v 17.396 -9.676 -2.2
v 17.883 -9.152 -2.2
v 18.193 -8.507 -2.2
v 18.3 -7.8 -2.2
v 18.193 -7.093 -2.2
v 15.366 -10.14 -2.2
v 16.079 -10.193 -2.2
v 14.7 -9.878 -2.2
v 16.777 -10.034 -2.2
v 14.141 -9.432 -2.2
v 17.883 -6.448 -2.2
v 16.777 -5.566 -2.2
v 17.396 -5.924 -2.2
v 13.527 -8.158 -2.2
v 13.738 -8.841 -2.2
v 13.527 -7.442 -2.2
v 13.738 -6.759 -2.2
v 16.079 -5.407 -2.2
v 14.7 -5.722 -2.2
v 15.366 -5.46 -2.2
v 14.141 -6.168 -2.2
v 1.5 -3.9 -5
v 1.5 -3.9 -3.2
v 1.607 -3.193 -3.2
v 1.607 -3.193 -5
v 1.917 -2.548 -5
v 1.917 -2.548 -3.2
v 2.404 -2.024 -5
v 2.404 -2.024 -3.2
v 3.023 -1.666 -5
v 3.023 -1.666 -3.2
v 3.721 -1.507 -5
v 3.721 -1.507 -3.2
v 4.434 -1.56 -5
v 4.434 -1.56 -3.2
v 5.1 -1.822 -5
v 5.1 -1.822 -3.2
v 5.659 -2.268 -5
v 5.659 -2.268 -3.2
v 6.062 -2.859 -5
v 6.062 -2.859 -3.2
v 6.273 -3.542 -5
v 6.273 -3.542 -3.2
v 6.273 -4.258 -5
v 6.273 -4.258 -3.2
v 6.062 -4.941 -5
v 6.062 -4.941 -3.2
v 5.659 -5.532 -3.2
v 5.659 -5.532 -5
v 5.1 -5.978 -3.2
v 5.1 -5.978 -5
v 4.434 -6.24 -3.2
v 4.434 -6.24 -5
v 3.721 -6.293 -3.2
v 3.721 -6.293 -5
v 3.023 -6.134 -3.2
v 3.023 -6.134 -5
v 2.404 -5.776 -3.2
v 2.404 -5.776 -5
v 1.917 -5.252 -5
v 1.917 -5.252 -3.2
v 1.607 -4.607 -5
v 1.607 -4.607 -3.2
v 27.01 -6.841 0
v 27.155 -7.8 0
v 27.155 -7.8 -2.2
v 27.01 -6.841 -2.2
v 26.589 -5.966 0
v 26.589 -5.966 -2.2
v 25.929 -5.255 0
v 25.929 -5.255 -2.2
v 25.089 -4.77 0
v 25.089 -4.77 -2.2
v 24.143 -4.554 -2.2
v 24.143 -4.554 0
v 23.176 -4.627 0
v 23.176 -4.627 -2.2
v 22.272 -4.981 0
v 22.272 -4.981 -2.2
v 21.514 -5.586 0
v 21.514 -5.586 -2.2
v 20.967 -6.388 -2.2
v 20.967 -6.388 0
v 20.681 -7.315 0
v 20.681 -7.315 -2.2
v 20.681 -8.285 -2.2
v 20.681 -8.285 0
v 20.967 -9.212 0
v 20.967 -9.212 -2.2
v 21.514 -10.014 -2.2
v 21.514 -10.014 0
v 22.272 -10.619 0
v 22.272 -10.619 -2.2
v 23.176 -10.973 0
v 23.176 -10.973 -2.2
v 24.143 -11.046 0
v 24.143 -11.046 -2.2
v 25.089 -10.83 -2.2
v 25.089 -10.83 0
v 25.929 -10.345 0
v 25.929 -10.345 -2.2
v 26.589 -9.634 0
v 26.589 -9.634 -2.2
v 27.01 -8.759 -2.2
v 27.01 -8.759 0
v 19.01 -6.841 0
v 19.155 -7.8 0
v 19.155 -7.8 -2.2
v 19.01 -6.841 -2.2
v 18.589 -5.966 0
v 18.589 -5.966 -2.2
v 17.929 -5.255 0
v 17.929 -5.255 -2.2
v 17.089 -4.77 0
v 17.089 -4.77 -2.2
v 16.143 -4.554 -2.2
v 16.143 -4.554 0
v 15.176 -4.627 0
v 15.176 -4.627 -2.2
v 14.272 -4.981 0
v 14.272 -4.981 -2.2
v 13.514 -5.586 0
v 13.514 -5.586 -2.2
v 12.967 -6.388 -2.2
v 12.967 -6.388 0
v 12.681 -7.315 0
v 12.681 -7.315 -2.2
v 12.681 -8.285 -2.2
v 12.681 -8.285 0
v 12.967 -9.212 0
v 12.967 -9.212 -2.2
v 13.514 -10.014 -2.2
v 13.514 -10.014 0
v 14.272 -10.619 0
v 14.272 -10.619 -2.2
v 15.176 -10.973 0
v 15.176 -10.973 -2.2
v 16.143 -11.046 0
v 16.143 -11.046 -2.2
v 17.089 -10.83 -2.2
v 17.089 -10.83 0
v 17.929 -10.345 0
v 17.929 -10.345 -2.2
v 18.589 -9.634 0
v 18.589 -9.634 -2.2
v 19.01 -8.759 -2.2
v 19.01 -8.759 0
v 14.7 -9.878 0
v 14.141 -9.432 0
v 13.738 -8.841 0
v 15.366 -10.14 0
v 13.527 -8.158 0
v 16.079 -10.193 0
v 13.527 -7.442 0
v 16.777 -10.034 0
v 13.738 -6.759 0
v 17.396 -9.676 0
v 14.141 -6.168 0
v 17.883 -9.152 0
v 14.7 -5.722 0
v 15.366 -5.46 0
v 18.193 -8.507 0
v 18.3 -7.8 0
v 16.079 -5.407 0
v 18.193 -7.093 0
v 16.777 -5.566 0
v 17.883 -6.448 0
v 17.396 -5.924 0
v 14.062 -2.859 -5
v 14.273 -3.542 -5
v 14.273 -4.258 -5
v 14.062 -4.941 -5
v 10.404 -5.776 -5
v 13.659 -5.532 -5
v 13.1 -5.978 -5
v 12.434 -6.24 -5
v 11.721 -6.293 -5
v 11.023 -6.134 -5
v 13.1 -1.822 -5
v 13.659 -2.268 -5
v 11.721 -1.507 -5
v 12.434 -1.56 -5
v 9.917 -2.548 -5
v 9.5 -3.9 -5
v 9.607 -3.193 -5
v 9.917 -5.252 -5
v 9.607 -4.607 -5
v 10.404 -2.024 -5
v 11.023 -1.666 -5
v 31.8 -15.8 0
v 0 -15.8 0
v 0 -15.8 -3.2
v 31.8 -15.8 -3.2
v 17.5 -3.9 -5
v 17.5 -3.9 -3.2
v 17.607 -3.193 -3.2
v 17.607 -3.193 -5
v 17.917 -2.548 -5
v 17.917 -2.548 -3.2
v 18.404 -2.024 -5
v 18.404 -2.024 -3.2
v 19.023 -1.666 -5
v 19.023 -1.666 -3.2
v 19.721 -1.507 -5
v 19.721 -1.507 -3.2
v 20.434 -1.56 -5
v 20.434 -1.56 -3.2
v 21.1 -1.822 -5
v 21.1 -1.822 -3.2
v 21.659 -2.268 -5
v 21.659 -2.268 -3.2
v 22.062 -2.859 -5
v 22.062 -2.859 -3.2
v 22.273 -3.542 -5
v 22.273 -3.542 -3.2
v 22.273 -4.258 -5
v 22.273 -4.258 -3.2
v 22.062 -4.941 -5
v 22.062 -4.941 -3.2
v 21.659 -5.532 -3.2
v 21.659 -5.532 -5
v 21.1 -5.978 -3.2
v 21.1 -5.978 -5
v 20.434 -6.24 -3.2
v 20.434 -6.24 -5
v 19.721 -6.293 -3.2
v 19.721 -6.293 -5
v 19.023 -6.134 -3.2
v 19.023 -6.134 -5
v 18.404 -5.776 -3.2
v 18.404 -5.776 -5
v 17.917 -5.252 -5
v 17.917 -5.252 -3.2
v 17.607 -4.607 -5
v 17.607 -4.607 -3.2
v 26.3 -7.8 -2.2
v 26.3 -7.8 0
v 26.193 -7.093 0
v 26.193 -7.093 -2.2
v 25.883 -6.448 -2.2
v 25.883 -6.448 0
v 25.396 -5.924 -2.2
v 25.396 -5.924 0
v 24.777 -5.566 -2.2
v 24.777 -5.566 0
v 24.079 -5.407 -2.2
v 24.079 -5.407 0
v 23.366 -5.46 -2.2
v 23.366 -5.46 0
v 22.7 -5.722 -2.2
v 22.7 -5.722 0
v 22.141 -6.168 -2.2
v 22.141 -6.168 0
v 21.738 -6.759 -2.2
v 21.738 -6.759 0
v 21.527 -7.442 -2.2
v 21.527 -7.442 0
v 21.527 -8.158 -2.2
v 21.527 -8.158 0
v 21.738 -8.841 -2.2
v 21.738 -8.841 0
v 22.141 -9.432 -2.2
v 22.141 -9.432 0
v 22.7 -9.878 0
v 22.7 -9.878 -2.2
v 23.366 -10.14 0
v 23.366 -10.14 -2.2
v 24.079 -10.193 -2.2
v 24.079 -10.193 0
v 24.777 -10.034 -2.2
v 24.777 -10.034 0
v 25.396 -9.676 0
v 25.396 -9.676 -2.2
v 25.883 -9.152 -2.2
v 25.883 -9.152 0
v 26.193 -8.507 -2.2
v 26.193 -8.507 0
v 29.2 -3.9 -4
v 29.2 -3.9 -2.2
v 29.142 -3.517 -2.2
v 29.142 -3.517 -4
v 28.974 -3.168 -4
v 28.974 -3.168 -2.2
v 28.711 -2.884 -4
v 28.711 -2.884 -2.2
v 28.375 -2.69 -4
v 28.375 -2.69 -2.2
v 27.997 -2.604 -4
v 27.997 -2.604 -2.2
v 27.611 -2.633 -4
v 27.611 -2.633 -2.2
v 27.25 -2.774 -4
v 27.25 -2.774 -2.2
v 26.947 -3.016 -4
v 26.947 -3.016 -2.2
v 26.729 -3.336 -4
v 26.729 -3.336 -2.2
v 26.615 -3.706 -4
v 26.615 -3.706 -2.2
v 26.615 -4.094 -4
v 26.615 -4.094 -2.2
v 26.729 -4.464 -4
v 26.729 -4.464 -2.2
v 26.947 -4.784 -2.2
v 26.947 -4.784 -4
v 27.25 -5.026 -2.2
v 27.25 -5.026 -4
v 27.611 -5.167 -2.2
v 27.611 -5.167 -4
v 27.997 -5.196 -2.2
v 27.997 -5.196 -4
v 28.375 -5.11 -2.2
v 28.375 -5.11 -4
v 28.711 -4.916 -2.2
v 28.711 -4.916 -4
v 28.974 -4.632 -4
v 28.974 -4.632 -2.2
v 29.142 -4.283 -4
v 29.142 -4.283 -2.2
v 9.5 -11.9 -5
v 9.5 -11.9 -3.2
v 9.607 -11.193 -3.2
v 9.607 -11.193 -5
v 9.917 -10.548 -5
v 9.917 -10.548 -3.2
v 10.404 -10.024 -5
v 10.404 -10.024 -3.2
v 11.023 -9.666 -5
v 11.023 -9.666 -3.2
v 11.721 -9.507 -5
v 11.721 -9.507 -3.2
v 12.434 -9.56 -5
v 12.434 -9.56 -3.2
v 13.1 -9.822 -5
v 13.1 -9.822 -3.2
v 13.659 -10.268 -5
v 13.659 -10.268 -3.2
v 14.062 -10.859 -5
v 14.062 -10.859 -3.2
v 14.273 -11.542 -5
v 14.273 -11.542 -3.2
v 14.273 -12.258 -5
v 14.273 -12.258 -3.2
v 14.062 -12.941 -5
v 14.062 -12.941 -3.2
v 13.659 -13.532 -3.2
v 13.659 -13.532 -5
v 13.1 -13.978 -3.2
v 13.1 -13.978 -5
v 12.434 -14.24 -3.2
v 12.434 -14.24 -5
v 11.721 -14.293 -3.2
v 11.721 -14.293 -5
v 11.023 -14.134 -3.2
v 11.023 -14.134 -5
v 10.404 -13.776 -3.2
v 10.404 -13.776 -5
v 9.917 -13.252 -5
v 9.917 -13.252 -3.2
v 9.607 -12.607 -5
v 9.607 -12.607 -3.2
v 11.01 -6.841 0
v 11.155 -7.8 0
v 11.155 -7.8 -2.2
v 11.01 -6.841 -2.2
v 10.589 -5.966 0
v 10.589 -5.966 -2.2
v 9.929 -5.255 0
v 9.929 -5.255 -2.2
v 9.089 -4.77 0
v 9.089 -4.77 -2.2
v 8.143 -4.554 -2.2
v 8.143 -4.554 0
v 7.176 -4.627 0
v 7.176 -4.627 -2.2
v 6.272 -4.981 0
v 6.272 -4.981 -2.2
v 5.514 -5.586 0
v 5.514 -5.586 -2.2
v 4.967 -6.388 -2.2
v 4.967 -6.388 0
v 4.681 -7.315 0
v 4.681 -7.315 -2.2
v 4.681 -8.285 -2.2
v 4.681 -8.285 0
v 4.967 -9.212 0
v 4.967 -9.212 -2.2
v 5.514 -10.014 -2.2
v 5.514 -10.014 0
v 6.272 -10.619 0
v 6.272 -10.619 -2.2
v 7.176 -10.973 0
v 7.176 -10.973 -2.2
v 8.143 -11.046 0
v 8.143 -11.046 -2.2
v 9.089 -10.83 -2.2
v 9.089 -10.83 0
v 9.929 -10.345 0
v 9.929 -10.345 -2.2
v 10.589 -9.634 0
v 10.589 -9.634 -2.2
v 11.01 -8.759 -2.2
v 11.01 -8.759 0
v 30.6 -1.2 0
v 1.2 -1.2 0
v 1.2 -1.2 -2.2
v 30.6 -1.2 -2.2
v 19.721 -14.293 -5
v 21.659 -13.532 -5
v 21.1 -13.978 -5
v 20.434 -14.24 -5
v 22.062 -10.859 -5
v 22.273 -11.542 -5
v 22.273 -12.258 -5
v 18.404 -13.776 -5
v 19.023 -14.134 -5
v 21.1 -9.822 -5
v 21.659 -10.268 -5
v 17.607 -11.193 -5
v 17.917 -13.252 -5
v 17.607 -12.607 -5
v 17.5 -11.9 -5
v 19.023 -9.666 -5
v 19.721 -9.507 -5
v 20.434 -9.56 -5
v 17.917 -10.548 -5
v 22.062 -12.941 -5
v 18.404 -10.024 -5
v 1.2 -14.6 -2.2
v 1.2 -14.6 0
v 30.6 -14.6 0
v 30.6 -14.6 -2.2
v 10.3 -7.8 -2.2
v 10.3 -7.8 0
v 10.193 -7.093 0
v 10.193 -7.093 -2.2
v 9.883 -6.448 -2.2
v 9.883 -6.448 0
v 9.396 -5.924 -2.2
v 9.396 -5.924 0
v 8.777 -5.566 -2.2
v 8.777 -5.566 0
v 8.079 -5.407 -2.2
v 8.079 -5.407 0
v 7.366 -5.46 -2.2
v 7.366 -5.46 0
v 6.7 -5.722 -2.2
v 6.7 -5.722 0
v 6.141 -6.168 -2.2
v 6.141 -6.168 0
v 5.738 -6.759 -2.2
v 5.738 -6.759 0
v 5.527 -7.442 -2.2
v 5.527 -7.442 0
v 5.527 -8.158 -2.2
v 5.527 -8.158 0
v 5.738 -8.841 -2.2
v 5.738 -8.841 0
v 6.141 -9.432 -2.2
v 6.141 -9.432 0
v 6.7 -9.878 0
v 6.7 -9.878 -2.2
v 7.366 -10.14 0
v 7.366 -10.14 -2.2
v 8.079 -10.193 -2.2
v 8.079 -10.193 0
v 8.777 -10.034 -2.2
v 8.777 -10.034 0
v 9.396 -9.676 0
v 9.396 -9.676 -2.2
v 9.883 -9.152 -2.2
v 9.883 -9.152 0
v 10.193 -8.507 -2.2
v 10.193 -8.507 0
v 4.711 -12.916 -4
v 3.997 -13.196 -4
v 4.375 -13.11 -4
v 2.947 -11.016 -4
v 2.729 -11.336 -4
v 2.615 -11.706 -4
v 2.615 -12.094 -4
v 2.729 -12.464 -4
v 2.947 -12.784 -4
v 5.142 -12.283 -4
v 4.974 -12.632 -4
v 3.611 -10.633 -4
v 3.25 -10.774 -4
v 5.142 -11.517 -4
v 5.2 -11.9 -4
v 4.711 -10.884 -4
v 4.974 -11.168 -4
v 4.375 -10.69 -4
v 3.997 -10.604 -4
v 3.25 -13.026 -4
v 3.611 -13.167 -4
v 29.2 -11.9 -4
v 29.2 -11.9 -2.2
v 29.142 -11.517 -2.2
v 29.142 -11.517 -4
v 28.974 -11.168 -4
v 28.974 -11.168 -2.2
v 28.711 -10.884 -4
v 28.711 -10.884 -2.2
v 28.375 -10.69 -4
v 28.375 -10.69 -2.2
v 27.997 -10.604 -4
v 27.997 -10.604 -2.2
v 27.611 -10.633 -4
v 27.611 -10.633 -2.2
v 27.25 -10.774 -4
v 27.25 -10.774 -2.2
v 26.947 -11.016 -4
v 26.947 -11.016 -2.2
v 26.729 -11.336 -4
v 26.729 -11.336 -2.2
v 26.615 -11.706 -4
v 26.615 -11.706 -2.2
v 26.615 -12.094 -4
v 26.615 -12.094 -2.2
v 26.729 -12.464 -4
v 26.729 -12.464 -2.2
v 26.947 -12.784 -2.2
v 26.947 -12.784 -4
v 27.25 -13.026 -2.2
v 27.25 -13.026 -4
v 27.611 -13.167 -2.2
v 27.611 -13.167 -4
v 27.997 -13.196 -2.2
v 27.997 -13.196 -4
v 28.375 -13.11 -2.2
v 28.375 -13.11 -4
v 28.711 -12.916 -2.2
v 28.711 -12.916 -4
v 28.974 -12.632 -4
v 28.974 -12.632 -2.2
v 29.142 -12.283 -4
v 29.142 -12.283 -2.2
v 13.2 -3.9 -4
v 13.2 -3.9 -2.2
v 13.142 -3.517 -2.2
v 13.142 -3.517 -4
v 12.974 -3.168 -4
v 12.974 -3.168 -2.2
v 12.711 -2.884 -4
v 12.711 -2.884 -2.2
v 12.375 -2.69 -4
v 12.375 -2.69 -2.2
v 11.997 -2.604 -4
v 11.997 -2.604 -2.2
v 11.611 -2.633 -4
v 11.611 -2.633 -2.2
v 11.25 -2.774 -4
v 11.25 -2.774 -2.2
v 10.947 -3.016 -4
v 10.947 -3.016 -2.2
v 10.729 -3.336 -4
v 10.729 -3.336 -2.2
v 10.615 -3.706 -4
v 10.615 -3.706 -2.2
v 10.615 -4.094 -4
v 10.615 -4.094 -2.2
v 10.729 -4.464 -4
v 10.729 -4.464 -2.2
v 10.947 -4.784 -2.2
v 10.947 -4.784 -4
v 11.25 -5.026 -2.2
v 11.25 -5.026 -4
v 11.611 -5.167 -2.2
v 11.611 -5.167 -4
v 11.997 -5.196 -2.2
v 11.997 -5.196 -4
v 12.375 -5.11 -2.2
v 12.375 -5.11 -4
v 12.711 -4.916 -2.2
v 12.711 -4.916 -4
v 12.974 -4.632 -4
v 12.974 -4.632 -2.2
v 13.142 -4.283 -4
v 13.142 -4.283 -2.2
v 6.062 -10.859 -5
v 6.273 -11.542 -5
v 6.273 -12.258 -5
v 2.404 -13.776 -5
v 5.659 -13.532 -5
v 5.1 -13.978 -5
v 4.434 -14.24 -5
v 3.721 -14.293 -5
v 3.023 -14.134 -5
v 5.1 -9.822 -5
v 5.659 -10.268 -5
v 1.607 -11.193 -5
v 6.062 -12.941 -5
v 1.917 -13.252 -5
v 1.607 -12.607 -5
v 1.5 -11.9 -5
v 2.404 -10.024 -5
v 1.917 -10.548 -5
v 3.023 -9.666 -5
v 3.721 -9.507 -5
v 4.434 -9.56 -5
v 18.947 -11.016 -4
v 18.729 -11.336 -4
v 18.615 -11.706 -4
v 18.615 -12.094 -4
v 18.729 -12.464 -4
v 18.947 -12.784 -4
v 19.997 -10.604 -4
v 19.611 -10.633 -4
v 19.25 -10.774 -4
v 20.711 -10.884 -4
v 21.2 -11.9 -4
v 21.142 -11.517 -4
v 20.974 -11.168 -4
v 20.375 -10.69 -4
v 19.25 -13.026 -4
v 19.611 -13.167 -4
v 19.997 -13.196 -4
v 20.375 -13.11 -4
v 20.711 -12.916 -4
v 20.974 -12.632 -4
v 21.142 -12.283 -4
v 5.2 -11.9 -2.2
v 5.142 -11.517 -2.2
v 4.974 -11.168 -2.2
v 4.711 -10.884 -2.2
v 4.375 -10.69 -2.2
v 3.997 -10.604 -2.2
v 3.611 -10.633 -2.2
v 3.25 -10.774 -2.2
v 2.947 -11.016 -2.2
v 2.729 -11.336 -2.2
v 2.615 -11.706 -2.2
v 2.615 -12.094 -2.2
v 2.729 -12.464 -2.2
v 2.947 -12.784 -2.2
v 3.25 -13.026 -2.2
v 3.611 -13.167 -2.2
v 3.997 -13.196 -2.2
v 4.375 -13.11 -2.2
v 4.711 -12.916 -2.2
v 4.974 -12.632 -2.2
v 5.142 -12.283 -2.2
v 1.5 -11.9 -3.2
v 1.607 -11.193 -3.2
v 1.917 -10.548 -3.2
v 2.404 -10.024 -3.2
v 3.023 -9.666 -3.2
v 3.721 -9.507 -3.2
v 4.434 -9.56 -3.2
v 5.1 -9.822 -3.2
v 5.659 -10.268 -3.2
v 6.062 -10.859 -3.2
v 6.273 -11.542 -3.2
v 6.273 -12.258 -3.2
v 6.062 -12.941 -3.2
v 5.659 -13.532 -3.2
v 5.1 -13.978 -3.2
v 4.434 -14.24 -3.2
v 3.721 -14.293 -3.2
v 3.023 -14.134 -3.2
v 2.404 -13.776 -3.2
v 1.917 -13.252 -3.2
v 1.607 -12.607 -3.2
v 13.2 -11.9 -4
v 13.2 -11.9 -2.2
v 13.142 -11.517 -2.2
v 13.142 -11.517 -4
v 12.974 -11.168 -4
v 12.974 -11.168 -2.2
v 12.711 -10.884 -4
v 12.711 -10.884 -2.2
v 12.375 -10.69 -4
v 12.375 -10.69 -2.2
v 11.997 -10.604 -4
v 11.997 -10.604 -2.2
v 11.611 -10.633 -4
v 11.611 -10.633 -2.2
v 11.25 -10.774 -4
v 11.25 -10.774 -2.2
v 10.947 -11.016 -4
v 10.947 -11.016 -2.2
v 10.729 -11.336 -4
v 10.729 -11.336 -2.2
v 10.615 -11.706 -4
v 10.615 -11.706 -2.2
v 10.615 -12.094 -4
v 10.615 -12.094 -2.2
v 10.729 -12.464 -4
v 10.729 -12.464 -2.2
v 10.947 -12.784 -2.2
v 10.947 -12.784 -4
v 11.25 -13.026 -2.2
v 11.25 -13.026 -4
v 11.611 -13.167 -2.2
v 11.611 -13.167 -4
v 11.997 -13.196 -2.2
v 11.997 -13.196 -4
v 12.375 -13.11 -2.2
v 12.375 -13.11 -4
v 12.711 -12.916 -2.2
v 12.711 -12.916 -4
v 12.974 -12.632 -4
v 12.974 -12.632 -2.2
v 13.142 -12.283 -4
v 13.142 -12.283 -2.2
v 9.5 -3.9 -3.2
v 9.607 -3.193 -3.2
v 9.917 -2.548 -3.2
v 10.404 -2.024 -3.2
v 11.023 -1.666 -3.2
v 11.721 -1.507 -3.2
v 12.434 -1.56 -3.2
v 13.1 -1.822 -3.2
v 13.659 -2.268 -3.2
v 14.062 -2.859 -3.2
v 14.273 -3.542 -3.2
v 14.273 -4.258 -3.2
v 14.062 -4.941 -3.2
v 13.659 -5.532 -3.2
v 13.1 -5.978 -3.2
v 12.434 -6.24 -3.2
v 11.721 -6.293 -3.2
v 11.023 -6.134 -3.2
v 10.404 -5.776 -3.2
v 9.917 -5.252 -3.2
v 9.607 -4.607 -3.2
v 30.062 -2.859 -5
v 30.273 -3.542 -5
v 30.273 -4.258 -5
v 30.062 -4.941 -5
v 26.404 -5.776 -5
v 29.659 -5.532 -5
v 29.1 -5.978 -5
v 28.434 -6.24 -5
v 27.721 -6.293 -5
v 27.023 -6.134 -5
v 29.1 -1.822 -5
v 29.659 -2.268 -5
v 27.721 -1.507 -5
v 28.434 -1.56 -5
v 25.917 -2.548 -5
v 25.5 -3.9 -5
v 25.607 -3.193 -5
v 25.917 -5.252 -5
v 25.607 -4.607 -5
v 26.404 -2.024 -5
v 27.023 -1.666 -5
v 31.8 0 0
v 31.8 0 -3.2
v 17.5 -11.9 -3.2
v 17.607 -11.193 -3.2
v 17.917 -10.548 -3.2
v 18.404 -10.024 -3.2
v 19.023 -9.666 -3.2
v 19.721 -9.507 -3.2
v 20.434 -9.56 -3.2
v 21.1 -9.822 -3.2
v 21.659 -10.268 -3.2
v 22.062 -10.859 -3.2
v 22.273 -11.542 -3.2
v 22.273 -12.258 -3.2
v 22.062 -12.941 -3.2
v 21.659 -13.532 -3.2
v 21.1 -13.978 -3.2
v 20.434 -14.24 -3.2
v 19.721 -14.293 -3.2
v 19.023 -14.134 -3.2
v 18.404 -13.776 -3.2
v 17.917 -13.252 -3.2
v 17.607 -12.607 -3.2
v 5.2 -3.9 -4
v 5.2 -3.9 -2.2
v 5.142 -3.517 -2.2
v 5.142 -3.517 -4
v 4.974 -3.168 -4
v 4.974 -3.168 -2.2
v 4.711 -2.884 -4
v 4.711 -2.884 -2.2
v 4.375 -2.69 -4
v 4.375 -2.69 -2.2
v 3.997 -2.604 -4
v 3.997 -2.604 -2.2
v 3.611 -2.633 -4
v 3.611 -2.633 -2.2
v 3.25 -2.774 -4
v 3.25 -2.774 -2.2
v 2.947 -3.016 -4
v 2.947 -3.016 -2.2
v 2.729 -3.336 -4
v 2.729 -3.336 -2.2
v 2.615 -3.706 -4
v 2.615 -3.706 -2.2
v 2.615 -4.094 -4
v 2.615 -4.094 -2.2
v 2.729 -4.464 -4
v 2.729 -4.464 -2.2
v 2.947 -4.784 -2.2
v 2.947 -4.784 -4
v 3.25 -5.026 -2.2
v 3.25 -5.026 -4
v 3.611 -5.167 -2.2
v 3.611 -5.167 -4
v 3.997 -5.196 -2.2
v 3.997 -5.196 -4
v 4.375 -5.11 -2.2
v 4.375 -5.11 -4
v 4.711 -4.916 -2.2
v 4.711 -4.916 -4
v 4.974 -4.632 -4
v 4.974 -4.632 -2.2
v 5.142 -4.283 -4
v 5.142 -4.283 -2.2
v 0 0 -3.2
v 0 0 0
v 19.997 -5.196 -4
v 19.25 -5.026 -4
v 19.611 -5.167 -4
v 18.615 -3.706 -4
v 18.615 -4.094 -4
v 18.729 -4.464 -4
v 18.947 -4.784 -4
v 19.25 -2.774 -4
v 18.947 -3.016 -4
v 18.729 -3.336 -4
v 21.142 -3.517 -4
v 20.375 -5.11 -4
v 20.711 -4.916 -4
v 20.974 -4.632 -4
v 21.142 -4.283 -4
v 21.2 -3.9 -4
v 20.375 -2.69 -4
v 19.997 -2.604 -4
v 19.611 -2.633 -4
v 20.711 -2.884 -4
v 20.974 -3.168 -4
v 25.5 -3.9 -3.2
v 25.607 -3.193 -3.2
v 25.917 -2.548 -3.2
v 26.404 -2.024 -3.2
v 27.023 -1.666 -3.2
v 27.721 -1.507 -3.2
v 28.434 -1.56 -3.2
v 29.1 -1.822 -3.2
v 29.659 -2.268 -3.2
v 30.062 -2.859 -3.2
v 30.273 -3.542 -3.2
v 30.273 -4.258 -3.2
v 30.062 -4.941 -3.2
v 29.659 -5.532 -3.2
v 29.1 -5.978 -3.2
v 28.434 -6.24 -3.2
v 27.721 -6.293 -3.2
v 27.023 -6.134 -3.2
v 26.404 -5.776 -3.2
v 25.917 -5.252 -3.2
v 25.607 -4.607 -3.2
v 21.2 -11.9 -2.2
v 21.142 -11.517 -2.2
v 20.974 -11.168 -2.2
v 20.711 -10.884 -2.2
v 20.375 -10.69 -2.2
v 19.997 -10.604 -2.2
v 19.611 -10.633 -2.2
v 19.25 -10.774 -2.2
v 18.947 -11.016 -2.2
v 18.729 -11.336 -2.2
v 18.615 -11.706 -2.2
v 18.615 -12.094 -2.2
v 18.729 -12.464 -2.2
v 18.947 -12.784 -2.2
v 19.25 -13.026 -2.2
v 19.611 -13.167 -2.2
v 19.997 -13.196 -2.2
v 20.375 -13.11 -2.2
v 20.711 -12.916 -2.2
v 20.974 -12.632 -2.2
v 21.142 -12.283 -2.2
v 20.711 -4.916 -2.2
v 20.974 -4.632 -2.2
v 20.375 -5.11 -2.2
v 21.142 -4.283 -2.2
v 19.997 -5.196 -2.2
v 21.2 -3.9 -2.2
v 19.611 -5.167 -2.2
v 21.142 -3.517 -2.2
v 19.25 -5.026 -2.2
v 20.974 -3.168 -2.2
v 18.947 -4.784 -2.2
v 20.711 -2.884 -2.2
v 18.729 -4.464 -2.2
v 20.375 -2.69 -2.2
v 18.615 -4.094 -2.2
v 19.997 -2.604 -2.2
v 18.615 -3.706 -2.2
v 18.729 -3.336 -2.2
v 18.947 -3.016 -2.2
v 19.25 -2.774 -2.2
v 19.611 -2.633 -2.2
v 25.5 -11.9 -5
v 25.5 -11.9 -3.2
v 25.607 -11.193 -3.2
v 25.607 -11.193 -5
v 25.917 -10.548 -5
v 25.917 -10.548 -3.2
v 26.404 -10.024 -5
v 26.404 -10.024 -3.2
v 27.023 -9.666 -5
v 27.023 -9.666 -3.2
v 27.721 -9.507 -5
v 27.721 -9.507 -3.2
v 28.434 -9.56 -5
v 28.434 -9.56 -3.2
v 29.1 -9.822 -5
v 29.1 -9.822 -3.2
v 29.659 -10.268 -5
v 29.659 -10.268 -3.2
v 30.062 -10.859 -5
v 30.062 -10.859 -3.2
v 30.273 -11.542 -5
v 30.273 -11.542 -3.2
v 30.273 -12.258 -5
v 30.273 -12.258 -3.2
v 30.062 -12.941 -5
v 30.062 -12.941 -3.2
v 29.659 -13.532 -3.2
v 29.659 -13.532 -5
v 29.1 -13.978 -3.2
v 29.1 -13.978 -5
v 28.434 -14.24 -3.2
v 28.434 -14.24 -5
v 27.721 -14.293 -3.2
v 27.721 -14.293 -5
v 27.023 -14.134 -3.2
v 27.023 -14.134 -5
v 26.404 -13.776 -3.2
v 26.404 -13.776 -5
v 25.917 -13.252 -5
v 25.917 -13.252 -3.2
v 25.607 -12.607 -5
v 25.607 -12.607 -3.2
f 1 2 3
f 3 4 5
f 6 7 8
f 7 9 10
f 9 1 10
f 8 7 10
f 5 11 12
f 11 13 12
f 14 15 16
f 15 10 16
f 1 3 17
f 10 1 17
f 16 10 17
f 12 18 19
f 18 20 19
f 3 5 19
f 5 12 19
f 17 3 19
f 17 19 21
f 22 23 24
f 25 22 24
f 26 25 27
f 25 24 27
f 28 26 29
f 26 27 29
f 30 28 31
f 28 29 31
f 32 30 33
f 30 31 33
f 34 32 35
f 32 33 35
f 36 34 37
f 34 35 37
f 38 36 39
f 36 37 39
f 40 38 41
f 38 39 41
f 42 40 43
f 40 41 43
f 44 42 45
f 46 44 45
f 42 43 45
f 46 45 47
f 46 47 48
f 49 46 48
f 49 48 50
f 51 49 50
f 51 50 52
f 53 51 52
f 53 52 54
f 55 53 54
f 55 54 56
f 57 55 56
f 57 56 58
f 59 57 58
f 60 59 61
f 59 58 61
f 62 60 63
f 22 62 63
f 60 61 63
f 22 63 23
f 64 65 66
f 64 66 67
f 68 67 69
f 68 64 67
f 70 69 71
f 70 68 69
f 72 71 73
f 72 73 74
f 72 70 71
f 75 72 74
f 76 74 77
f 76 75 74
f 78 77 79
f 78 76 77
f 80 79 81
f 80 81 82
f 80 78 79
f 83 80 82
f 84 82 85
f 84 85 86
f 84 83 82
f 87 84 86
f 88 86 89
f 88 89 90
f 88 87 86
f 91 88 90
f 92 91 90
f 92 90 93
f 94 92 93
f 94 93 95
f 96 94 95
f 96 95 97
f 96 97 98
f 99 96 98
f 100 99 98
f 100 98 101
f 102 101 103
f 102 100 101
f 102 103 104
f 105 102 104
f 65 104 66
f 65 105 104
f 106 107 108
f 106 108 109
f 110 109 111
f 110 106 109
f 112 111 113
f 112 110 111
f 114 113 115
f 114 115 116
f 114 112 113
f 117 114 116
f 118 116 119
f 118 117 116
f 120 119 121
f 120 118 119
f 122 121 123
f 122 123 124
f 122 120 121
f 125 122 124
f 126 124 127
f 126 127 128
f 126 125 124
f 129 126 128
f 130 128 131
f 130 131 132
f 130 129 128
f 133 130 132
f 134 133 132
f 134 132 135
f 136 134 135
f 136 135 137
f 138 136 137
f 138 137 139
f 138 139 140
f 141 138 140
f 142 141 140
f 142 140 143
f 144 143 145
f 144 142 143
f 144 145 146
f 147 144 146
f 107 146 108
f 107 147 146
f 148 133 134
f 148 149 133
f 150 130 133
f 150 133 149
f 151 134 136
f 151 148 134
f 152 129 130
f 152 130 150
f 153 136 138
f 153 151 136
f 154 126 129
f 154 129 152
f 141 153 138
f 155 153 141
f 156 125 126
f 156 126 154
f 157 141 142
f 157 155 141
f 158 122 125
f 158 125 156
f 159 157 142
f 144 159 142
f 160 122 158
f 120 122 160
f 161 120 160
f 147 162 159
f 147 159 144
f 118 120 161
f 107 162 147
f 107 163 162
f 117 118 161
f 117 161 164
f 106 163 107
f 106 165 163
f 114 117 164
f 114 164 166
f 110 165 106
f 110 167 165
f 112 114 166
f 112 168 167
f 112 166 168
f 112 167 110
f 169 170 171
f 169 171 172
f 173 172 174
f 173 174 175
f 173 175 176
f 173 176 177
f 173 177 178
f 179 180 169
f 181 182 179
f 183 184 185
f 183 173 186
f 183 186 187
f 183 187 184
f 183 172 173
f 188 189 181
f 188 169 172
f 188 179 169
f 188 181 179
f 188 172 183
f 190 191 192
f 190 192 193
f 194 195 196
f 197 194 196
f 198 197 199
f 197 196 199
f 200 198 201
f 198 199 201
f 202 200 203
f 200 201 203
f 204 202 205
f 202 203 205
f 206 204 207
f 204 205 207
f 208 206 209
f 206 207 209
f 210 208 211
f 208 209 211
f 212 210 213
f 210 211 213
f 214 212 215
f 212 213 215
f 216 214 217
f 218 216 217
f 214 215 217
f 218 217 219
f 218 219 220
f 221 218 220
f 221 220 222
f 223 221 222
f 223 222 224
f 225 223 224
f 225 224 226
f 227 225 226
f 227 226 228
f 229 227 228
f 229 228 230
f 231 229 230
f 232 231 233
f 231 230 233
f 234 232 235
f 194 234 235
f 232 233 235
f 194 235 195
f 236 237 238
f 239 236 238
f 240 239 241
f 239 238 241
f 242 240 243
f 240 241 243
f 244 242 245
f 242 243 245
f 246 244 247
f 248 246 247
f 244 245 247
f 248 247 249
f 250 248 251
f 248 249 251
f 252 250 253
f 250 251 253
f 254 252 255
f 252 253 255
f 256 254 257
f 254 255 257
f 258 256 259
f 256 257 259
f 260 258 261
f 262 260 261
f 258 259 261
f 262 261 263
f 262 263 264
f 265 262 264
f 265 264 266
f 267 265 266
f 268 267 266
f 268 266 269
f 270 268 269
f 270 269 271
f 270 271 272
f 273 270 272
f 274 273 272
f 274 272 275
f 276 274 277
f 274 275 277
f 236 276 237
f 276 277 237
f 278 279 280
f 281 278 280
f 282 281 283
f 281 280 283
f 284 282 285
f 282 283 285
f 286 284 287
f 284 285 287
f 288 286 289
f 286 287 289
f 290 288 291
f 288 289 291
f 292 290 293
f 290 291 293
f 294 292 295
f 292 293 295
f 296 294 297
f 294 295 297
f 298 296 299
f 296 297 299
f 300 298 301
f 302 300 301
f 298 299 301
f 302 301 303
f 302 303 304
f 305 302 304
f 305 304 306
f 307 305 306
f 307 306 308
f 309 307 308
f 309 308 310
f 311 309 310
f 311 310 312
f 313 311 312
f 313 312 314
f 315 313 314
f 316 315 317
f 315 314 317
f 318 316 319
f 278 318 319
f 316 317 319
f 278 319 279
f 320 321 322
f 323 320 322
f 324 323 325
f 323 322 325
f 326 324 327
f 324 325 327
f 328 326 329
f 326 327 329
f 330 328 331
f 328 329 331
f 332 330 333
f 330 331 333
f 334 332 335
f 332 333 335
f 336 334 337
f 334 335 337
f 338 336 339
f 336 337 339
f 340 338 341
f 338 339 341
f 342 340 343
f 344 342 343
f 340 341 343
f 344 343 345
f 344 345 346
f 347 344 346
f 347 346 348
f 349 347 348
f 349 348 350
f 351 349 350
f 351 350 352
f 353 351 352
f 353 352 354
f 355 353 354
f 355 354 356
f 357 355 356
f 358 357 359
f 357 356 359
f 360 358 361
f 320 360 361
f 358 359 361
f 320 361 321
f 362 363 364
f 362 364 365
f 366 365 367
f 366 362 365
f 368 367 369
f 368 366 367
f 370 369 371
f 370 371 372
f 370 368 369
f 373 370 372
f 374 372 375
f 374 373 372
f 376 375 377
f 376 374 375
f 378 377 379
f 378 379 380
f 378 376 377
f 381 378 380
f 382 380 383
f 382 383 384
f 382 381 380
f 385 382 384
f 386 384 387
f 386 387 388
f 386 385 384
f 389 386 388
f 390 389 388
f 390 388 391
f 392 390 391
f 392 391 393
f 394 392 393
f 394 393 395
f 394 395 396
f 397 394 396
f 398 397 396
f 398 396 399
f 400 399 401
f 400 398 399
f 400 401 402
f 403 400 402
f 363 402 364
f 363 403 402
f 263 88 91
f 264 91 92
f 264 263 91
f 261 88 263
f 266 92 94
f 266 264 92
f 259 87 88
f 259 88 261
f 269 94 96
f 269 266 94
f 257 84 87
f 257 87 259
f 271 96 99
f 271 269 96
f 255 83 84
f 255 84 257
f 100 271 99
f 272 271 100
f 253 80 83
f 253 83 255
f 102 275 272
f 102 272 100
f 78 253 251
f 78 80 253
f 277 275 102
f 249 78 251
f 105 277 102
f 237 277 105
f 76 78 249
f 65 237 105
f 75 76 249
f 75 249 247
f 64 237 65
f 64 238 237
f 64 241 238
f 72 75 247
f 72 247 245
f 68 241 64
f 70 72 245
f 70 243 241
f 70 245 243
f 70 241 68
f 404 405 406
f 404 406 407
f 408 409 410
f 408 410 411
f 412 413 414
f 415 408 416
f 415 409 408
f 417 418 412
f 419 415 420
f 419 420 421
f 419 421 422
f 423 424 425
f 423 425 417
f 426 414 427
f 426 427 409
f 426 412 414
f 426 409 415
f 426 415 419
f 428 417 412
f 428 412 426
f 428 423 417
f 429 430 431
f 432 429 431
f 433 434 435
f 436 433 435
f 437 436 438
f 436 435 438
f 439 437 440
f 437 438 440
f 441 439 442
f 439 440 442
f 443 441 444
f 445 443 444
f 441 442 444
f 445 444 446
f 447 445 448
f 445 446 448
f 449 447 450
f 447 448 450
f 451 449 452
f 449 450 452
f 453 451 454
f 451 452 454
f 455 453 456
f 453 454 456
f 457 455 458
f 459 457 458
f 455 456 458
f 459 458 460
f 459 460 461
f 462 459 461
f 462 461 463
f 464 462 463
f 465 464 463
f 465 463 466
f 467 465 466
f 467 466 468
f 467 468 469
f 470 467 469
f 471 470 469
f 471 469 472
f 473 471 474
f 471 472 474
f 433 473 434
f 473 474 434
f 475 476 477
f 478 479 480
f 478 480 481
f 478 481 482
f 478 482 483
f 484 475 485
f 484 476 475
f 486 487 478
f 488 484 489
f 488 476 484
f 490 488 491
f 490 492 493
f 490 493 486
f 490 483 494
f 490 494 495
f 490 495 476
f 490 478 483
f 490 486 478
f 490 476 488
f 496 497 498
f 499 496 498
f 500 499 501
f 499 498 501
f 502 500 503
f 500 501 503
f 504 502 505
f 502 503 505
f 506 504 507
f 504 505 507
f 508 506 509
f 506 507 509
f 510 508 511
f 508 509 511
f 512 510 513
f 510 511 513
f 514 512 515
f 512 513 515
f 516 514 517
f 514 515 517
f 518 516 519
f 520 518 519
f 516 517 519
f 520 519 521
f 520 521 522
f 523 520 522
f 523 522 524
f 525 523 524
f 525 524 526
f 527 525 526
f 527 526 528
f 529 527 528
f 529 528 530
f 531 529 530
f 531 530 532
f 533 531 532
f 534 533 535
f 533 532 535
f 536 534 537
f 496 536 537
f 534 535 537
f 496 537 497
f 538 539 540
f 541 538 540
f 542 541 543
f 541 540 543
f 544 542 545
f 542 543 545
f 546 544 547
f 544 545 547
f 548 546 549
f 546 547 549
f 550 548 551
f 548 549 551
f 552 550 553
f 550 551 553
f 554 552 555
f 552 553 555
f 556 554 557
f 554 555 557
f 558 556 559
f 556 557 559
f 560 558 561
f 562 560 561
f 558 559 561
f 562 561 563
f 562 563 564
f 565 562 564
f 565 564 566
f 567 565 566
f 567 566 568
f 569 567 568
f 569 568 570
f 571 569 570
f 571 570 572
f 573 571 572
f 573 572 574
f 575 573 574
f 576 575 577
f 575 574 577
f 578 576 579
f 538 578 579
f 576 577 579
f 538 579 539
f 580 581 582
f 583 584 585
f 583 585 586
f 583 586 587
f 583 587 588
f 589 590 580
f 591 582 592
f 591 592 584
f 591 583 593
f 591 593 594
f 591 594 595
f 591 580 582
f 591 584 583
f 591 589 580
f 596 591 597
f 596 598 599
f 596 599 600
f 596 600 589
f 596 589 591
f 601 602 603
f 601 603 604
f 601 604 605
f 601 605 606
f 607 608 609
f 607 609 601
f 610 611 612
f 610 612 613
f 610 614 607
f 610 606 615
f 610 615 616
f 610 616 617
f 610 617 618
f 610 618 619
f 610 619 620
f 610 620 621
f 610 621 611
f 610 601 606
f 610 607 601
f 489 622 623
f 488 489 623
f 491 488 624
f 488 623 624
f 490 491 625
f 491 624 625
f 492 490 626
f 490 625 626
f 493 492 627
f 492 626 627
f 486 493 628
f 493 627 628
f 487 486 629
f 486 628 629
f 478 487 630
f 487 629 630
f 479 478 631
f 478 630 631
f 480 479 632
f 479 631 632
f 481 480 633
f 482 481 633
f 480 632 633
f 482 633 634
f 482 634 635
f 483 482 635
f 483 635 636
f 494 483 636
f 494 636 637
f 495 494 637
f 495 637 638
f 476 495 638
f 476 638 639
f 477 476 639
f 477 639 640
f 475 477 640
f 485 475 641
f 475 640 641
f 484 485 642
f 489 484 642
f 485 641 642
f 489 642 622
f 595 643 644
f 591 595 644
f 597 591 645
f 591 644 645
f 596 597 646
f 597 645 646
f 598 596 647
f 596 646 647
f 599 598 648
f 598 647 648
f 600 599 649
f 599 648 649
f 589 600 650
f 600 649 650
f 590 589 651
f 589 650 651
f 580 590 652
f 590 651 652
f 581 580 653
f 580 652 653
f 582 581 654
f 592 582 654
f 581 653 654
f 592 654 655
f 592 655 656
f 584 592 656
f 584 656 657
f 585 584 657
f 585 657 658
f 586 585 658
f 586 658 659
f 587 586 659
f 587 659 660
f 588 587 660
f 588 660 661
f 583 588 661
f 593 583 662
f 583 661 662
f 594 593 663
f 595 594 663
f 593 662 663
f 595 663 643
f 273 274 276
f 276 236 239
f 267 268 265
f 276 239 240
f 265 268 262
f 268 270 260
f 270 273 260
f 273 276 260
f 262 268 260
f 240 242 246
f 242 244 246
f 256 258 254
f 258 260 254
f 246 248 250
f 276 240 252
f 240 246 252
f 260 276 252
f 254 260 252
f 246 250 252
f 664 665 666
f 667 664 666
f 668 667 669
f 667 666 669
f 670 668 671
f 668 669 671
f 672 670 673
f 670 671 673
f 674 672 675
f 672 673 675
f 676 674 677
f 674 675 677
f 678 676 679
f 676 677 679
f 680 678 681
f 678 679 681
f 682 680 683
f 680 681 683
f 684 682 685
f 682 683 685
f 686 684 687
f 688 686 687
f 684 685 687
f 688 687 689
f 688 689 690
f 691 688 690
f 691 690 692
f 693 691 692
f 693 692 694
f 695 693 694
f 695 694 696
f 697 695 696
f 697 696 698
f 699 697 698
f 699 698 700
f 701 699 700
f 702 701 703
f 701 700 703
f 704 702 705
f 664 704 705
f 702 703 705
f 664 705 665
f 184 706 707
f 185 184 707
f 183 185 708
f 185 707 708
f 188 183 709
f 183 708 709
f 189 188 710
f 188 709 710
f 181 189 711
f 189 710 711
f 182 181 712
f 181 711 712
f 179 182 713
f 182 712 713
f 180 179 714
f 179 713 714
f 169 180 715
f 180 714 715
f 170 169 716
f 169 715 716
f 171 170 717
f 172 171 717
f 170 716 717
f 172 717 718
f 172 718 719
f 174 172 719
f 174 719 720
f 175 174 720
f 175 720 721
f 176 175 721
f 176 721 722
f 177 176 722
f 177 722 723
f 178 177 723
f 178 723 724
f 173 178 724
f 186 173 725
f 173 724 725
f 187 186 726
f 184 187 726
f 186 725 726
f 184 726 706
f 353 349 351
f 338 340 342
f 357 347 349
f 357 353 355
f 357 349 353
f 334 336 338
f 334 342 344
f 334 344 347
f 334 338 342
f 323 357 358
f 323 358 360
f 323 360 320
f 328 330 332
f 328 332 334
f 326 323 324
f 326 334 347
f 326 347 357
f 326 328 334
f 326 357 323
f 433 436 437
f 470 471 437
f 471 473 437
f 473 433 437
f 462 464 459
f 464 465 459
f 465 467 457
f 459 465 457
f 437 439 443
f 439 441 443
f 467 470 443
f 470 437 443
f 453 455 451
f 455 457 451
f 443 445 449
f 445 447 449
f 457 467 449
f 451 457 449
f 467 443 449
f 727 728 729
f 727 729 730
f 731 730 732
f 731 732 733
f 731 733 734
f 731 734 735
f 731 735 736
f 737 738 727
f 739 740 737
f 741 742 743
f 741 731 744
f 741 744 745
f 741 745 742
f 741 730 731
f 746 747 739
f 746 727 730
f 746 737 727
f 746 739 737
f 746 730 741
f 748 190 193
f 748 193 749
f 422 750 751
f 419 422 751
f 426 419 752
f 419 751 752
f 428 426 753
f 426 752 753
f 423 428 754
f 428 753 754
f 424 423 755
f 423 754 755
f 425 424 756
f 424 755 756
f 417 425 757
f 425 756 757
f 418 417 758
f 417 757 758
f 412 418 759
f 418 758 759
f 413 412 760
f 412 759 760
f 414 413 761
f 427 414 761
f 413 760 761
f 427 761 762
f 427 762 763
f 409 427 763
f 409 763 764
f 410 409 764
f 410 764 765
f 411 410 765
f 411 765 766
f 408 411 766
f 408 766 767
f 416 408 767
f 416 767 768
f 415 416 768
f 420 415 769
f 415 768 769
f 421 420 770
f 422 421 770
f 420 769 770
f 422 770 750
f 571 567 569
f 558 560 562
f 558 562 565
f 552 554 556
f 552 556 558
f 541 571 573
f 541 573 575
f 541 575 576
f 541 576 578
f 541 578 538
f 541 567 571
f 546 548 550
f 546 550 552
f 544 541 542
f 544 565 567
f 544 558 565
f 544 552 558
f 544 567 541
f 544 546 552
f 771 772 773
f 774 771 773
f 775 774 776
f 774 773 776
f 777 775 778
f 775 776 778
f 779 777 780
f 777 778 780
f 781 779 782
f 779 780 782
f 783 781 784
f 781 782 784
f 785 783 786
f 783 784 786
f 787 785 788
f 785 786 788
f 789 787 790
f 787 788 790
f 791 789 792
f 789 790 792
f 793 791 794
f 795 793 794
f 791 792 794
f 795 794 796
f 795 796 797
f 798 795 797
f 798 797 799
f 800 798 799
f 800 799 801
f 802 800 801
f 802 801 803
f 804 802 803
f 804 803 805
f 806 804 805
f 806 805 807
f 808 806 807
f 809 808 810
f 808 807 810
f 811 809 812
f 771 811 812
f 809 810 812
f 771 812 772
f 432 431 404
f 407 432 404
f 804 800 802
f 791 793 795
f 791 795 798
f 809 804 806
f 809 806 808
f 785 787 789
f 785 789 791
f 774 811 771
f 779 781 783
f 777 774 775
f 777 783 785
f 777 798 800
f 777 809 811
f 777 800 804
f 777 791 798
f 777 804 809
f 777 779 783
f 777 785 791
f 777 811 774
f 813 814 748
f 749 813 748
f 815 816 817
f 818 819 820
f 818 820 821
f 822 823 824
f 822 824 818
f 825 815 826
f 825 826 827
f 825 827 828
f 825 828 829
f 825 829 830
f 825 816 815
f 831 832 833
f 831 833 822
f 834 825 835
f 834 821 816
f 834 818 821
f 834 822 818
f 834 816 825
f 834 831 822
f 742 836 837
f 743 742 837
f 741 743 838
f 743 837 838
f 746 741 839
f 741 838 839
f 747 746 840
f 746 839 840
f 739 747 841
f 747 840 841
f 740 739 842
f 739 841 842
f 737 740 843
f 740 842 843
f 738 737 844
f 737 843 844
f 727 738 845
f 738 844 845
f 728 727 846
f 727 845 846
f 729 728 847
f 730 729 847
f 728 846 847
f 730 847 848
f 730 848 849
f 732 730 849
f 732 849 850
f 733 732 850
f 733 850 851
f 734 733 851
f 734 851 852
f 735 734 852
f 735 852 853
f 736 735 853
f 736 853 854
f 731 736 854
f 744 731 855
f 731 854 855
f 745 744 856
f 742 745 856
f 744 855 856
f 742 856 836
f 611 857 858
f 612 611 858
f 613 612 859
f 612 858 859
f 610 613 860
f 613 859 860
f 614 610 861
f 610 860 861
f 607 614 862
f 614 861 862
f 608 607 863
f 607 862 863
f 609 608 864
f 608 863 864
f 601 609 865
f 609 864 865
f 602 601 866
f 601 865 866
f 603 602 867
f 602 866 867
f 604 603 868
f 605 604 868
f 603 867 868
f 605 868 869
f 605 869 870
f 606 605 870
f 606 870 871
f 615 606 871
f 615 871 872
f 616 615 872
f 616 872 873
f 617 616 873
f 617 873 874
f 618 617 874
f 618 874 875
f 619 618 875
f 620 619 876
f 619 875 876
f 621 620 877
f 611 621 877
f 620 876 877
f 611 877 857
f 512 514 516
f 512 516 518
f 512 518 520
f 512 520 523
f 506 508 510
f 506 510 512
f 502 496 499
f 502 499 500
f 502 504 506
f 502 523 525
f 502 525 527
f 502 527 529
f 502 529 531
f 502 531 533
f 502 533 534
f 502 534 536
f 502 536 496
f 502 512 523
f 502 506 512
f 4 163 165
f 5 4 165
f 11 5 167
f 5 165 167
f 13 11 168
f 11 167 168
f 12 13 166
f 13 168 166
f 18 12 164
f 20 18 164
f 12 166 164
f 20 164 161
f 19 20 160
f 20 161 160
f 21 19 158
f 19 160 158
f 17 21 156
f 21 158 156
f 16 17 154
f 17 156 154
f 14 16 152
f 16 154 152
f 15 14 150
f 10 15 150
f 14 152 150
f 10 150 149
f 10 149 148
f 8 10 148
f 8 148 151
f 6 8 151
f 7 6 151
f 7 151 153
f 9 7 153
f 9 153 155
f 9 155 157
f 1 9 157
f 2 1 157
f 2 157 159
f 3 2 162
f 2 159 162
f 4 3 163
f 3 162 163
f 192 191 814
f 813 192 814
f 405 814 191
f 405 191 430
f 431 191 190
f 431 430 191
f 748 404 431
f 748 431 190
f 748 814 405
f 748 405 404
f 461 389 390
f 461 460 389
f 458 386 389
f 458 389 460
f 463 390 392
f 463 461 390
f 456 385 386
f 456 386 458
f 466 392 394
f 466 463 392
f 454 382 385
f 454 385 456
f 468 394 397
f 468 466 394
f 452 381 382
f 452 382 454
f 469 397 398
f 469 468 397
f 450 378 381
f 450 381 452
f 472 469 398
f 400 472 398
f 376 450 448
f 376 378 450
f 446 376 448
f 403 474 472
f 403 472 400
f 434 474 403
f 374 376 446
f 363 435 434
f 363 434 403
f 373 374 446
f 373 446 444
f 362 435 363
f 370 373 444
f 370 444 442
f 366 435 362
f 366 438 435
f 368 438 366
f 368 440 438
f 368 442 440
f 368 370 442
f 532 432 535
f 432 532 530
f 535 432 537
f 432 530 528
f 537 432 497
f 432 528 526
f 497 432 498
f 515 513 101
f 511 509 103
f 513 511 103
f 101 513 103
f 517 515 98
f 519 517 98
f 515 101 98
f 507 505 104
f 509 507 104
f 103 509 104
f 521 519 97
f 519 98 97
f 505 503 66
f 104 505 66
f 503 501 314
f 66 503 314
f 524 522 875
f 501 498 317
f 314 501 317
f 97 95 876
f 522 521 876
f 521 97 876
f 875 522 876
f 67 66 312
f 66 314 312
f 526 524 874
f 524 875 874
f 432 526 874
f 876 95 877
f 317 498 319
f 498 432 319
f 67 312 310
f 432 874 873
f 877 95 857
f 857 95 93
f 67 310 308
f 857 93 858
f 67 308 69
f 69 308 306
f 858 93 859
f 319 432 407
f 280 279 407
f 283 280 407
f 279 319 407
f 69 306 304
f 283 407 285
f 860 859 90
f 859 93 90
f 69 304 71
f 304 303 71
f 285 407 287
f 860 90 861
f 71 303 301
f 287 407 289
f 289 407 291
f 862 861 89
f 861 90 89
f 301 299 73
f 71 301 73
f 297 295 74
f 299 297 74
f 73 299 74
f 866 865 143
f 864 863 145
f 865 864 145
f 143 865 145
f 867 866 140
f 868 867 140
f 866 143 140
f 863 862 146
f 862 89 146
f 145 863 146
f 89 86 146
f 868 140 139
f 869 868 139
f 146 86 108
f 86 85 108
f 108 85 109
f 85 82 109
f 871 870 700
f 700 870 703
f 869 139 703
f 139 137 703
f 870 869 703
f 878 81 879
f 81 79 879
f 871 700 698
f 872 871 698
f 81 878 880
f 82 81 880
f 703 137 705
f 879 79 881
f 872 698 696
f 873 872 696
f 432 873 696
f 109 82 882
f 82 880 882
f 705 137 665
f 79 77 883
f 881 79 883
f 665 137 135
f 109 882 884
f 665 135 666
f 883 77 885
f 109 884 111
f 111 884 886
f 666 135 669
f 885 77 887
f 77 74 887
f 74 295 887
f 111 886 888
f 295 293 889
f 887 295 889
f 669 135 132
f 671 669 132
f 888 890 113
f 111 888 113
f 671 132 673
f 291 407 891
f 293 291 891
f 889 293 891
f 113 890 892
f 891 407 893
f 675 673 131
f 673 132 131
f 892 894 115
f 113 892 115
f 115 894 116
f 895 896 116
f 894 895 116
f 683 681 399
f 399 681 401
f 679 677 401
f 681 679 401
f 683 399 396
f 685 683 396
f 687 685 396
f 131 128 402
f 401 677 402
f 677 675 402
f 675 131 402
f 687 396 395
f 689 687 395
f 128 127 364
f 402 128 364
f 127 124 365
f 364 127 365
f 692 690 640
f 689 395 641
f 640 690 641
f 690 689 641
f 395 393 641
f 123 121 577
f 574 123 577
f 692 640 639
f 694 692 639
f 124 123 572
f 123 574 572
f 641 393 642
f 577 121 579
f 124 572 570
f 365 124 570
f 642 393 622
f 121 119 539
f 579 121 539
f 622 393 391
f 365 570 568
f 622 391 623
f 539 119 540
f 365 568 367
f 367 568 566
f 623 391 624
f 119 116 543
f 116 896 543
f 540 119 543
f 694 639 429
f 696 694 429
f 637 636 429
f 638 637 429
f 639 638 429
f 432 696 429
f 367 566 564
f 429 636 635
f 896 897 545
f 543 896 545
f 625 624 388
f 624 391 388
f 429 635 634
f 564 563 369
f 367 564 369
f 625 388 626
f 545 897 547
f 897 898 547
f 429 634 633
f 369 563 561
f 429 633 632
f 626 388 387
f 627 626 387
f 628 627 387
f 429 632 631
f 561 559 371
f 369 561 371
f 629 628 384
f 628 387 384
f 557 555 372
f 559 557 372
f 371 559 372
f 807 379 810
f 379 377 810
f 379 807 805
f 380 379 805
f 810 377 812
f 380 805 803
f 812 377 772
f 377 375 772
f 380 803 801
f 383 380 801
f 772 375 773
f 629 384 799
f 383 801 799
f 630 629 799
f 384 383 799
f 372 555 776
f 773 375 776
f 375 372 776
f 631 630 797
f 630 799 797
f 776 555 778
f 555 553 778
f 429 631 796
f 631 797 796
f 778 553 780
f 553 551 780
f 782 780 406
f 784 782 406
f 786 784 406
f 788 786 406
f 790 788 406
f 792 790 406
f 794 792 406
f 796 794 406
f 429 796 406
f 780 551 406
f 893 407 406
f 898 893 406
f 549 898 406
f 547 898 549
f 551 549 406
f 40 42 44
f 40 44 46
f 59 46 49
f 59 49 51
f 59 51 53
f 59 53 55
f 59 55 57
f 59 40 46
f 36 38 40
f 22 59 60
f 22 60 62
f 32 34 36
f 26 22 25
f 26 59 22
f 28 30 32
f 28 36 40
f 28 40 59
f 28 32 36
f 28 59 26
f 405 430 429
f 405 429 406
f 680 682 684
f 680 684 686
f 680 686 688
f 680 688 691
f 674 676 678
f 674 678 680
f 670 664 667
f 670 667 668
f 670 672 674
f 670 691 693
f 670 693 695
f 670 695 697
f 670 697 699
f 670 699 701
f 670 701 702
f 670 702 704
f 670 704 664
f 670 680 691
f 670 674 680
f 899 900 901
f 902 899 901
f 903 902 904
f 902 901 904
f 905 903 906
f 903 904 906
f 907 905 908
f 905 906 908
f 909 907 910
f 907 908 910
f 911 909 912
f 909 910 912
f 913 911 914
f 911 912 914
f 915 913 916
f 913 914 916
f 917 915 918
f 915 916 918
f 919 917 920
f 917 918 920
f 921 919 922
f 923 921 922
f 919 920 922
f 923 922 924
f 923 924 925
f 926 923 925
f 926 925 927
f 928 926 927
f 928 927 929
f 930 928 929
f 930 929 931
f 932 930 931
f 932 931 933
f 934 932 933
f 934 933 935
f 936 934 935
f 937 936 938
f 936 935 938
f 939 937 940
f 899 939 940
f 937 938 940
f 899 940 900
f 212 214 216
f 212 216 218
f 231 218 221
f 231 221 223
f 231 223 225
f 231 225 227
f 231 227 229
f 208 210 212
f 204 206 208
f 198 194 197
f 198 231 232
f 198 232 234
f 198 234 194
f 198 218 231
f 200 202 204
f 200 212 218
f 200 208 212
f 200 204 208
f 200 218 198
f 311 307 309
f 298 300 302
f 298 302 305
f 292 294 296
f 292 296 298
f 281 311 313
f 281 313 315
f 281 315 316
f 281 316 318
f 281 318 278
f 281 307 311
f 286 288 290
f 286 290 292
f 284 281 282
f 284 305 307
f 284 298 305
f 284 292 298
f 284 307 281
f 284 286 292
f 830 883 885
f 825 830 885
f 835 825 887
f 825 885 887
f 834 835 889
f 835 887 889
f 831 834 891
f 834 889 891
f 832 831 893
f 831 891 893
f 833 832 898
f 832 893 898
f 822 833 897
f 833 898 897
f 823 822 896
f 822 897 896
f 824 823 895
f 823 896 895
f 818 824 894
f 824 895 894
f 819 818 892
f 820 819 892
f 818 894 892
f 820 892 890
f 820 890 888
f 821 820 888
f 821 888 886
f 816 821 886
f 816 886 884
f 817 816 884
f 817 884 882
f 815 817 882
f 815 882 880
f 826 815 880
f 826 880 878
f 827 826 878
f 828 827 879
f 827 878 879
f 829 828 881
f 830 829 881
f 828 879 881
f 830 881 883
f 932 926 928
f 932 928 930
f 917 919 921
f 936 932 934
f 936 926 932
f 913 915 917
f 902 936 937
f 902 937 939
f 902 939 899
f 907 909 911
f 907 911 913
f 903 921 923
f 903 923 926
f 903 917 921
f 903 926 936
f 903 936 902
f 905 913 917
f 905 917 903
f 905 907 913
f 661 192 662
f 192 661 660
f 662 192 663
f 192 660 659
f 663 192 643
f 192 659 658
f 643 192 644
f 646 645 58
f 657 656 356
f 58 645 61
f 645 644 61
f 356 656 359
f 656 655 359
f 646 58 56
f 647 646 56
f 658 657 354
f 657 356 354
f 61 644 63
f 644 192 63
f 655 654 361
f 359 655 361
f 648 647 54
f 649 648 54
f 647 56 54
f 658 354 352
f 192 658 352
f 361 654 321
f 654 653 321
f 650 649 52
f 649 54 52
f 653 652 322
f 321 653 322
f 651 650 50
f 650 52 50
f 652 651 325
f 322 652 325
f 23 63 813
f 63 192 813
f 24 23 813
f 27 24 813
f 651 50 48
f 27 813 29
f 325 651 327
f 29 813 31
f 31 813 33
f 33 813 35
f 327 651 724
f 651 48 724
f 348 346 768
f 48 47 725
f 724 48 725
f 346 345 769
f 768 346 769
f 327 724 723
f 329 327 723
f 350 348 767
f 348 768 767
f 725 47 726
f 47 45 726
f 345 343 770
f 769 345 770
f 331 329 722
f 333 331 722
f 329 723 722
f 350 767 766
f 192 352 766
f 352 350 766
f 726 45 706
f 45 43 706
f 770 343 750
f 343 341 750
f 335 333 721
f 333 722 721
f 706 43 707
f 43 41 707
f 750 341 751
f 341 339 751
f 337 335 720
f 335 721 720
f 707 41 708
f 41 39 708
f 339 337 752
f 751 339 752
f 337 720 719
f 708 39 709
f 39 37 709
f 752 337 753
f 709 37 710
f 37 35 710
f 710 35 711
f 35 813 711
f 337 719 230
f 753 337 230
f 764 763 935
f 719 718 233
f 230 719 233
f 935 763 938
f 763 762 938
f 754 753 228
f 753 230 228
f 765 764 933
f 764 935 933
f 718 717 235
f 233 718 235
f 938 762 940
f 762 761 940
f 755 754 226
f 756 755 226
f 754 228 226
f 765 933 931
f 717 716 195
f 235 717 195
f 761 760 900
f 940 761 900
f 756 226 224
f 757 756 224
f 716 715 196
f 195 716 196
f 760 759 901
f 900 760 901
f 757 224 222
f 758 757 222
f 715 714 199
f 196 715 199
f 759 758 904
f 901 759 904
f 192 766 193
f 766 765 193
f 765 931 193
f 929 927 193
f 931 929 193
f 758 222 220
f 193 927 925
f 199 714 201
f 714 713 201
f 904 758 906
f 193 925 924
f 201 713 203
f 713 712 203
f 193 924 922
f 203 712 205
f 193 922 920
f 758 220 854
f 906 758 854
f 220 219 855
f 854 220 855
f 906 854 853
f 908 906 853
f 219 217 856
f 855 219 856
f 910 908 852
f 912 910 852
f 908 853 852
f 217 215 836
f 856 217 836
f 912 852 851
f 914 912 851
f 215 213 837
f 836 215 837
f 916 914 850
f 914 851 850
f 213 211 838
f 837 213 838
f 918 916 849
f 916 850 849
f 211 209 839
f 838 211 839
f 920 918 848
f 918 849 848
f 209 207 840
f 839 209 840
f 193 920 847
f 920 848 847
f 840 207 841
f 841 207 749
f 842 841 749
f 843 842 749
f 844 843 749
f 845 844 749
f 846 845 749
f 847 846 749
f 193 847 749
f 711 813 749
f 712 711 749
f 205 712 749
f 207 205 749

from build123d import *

# Parameters (mm, degrees)
SKETCH2_W             = 31.8
SKETCH2_H             = 15.8
SKETCH2_W_2           = 29.4
SKETCH2_H_2           = 13.4
BOSS_EXTRUDE1_DEPTH   = 3.2
SKETCH2_3_R           = 3.255
SKETCH2_3_R_2         = 2.4
BOSS_EXTRUDE2_DEPTH   = 2.2
BOSS_EXTRUDE2_2_DEPTH = 2.2
BOSS_EXTRUDE2_3_DEPTH = 2.2
SKETCH3_W             = 29.4
SKETCH3_H             = 13.4
BOSS_EXTRUDE3_DEPTH   = 1
SKETCH4_R             = 2.4
SKETCH4_R_2           = 2.399999999
BOSS_EXTRUDE4_DEPTH   = 1.8
SKETCH5_R             = 1.3
CUT_EXTRUDE1_DEPTH    = 1.8


with BuildPart() as part:
    # Sketch2 → Boss-Extrude1 (new body)
    with BuildSketch(Plane.XY):
        with Locations((15.9, -7.9)):
            Rectangle(SKETCH2_W, SKETCH2_H)
        with Locations((15.9, -7.9)):
            Rectangle(SKETCH2_W_2, SKETCH2_H_2, mode=Mode.SUBTRACT)
    extrude(amount=-BOSS_EXTRUDE1_DEPTH)



with BuildPart() as body_2:
    # Sketch2<3> → Boss-Extrude2 (new body)
    with BuildSketch(Plane.XY):
        with Locations((23.9, -7.8)):
            Circle(SKETCH2_3_R)
        with Locations((23.9, -7.8)):
            Circle(SKETCH2_3_R_2, mode=Mode.SUBTRACT)
    extrude(amount=-BOSS_EXTRUDE2_DEPTH)


with BuildPart() as body_3:
    # Sketch2<3> → Boss-Extrude2 2 (new body)
    with BuildSketch(Plane.XY):
        with Locations((15.899999998, -7.8)):
            Circle(SKETCH2_3_R)
        with Locations((15.899999998, -7.8)):
            Circle(SKETCH2_3_R_2, mode=Mode.SUBTRACT)
    extrude(amount=-BOSS_EXTRUDE2_2_DEPTH)


with BuildPart() as body_4:
    # Sketch2<3> → Boss-Extrude2 3 (new body)
    with BuildSketch(Plane.XY):
        with Locations((7.899999996, -7.8)):
            Circle(SKETCH2_3_R)
        with Locations((7.899999996, -7.8)):
            Circle(SKETCH2_3_R_2, mode=Mode.SUBTRACT)
    extrude(amount=-BOSS_EXTRUDE2_3_DEPTH)


with BuildPart() as part_1:
    add(part.part)

    add(body_2.part)  # Boss-Extrude3 merges body 2

    add(body_3.part)  # Boss-Extrude3 merges body 3

    add(body_4.part)  # Boss-Extrude3 merges body 4
    # Sketch3 → Boss-Extrude3 (add)
    with BuildSketch(Plane(origin=(0, 0, -2.2), x_dir=(-1, 0, 0), z_dir=(0, 0, -1))):
        with Locations((-15.9, -7.9)):
            Rectangle(SKETCH3_W, SKETCH3_H)
    extrude(amount=BOSS_EXTRUDE3_DEPTH)

    # Sketch4 → Boss-Extrude4 (add)
    with BuildSketch(Plane(origin=(0, 0, -3.2), x_dir=(-1, 0, 0), z_dir=(0, 0, -1))):
        with Locations((-27.9, -3.9)):
            Circle(SKETCH4_R)
        with Locations((-19.899999998, -3.9)):
            Circle(SKETCH4_R)
        with Locations((-11.899999996, -3.9)):
            Circle(SKETCH4_R)
        with Locations((-3.899999994, -3.9)):
            Circle(SKETCH4_R)
        with Locations((-19.899999998, -11.9)):
            Circle(SKETCH4_R_2)
        with Locations((-11.899999996, -11.9)):
            Circle(SKETCH4_R_2)
        with Locations((-3.899999994, -11.9)):
            Circle(SKETCH4_R_2)
        with Locations((-27.9, -11.9)):
            Circle(SKETCH4_R_2)
    extrude(amount=BOSS_EXTRUDE4_DEPTH)

    # Sketch5 → Cut-Extrude1 (cut)
    with BuildSketch(Plane.XY.offset(-2.2)):
        with Locations((3.899999994, -3.9)):
            Circle(SKETCH5_R)
        with Locations((11.899999996, -3.9)):
            Circle(SKETCH5_R)
        with Locations((19.899999998, -3.9)):
            Circle(SKETCH5_R)
        with Locations((27.9, -3.9)):
            Circle(SKETCH5_R)
        with Locations((11.899999996, -11.900000002)):
            Circle(SKETCH5_R)
        with Locations((19.899999998, -11.900000002)):
            Circle(SKETCH5_R)
        with Locations((27.9, -11.900000002)):
            Circle(SKETCH5_R)
        with Locations((3.899999994, -11.900000002)):
            Circle(SKETCH5_R)
    extrude(amount=-CUT_EXTRUDE1_DEPTH, mode=Mode.SUBTRACT)


solid = part_1.part
